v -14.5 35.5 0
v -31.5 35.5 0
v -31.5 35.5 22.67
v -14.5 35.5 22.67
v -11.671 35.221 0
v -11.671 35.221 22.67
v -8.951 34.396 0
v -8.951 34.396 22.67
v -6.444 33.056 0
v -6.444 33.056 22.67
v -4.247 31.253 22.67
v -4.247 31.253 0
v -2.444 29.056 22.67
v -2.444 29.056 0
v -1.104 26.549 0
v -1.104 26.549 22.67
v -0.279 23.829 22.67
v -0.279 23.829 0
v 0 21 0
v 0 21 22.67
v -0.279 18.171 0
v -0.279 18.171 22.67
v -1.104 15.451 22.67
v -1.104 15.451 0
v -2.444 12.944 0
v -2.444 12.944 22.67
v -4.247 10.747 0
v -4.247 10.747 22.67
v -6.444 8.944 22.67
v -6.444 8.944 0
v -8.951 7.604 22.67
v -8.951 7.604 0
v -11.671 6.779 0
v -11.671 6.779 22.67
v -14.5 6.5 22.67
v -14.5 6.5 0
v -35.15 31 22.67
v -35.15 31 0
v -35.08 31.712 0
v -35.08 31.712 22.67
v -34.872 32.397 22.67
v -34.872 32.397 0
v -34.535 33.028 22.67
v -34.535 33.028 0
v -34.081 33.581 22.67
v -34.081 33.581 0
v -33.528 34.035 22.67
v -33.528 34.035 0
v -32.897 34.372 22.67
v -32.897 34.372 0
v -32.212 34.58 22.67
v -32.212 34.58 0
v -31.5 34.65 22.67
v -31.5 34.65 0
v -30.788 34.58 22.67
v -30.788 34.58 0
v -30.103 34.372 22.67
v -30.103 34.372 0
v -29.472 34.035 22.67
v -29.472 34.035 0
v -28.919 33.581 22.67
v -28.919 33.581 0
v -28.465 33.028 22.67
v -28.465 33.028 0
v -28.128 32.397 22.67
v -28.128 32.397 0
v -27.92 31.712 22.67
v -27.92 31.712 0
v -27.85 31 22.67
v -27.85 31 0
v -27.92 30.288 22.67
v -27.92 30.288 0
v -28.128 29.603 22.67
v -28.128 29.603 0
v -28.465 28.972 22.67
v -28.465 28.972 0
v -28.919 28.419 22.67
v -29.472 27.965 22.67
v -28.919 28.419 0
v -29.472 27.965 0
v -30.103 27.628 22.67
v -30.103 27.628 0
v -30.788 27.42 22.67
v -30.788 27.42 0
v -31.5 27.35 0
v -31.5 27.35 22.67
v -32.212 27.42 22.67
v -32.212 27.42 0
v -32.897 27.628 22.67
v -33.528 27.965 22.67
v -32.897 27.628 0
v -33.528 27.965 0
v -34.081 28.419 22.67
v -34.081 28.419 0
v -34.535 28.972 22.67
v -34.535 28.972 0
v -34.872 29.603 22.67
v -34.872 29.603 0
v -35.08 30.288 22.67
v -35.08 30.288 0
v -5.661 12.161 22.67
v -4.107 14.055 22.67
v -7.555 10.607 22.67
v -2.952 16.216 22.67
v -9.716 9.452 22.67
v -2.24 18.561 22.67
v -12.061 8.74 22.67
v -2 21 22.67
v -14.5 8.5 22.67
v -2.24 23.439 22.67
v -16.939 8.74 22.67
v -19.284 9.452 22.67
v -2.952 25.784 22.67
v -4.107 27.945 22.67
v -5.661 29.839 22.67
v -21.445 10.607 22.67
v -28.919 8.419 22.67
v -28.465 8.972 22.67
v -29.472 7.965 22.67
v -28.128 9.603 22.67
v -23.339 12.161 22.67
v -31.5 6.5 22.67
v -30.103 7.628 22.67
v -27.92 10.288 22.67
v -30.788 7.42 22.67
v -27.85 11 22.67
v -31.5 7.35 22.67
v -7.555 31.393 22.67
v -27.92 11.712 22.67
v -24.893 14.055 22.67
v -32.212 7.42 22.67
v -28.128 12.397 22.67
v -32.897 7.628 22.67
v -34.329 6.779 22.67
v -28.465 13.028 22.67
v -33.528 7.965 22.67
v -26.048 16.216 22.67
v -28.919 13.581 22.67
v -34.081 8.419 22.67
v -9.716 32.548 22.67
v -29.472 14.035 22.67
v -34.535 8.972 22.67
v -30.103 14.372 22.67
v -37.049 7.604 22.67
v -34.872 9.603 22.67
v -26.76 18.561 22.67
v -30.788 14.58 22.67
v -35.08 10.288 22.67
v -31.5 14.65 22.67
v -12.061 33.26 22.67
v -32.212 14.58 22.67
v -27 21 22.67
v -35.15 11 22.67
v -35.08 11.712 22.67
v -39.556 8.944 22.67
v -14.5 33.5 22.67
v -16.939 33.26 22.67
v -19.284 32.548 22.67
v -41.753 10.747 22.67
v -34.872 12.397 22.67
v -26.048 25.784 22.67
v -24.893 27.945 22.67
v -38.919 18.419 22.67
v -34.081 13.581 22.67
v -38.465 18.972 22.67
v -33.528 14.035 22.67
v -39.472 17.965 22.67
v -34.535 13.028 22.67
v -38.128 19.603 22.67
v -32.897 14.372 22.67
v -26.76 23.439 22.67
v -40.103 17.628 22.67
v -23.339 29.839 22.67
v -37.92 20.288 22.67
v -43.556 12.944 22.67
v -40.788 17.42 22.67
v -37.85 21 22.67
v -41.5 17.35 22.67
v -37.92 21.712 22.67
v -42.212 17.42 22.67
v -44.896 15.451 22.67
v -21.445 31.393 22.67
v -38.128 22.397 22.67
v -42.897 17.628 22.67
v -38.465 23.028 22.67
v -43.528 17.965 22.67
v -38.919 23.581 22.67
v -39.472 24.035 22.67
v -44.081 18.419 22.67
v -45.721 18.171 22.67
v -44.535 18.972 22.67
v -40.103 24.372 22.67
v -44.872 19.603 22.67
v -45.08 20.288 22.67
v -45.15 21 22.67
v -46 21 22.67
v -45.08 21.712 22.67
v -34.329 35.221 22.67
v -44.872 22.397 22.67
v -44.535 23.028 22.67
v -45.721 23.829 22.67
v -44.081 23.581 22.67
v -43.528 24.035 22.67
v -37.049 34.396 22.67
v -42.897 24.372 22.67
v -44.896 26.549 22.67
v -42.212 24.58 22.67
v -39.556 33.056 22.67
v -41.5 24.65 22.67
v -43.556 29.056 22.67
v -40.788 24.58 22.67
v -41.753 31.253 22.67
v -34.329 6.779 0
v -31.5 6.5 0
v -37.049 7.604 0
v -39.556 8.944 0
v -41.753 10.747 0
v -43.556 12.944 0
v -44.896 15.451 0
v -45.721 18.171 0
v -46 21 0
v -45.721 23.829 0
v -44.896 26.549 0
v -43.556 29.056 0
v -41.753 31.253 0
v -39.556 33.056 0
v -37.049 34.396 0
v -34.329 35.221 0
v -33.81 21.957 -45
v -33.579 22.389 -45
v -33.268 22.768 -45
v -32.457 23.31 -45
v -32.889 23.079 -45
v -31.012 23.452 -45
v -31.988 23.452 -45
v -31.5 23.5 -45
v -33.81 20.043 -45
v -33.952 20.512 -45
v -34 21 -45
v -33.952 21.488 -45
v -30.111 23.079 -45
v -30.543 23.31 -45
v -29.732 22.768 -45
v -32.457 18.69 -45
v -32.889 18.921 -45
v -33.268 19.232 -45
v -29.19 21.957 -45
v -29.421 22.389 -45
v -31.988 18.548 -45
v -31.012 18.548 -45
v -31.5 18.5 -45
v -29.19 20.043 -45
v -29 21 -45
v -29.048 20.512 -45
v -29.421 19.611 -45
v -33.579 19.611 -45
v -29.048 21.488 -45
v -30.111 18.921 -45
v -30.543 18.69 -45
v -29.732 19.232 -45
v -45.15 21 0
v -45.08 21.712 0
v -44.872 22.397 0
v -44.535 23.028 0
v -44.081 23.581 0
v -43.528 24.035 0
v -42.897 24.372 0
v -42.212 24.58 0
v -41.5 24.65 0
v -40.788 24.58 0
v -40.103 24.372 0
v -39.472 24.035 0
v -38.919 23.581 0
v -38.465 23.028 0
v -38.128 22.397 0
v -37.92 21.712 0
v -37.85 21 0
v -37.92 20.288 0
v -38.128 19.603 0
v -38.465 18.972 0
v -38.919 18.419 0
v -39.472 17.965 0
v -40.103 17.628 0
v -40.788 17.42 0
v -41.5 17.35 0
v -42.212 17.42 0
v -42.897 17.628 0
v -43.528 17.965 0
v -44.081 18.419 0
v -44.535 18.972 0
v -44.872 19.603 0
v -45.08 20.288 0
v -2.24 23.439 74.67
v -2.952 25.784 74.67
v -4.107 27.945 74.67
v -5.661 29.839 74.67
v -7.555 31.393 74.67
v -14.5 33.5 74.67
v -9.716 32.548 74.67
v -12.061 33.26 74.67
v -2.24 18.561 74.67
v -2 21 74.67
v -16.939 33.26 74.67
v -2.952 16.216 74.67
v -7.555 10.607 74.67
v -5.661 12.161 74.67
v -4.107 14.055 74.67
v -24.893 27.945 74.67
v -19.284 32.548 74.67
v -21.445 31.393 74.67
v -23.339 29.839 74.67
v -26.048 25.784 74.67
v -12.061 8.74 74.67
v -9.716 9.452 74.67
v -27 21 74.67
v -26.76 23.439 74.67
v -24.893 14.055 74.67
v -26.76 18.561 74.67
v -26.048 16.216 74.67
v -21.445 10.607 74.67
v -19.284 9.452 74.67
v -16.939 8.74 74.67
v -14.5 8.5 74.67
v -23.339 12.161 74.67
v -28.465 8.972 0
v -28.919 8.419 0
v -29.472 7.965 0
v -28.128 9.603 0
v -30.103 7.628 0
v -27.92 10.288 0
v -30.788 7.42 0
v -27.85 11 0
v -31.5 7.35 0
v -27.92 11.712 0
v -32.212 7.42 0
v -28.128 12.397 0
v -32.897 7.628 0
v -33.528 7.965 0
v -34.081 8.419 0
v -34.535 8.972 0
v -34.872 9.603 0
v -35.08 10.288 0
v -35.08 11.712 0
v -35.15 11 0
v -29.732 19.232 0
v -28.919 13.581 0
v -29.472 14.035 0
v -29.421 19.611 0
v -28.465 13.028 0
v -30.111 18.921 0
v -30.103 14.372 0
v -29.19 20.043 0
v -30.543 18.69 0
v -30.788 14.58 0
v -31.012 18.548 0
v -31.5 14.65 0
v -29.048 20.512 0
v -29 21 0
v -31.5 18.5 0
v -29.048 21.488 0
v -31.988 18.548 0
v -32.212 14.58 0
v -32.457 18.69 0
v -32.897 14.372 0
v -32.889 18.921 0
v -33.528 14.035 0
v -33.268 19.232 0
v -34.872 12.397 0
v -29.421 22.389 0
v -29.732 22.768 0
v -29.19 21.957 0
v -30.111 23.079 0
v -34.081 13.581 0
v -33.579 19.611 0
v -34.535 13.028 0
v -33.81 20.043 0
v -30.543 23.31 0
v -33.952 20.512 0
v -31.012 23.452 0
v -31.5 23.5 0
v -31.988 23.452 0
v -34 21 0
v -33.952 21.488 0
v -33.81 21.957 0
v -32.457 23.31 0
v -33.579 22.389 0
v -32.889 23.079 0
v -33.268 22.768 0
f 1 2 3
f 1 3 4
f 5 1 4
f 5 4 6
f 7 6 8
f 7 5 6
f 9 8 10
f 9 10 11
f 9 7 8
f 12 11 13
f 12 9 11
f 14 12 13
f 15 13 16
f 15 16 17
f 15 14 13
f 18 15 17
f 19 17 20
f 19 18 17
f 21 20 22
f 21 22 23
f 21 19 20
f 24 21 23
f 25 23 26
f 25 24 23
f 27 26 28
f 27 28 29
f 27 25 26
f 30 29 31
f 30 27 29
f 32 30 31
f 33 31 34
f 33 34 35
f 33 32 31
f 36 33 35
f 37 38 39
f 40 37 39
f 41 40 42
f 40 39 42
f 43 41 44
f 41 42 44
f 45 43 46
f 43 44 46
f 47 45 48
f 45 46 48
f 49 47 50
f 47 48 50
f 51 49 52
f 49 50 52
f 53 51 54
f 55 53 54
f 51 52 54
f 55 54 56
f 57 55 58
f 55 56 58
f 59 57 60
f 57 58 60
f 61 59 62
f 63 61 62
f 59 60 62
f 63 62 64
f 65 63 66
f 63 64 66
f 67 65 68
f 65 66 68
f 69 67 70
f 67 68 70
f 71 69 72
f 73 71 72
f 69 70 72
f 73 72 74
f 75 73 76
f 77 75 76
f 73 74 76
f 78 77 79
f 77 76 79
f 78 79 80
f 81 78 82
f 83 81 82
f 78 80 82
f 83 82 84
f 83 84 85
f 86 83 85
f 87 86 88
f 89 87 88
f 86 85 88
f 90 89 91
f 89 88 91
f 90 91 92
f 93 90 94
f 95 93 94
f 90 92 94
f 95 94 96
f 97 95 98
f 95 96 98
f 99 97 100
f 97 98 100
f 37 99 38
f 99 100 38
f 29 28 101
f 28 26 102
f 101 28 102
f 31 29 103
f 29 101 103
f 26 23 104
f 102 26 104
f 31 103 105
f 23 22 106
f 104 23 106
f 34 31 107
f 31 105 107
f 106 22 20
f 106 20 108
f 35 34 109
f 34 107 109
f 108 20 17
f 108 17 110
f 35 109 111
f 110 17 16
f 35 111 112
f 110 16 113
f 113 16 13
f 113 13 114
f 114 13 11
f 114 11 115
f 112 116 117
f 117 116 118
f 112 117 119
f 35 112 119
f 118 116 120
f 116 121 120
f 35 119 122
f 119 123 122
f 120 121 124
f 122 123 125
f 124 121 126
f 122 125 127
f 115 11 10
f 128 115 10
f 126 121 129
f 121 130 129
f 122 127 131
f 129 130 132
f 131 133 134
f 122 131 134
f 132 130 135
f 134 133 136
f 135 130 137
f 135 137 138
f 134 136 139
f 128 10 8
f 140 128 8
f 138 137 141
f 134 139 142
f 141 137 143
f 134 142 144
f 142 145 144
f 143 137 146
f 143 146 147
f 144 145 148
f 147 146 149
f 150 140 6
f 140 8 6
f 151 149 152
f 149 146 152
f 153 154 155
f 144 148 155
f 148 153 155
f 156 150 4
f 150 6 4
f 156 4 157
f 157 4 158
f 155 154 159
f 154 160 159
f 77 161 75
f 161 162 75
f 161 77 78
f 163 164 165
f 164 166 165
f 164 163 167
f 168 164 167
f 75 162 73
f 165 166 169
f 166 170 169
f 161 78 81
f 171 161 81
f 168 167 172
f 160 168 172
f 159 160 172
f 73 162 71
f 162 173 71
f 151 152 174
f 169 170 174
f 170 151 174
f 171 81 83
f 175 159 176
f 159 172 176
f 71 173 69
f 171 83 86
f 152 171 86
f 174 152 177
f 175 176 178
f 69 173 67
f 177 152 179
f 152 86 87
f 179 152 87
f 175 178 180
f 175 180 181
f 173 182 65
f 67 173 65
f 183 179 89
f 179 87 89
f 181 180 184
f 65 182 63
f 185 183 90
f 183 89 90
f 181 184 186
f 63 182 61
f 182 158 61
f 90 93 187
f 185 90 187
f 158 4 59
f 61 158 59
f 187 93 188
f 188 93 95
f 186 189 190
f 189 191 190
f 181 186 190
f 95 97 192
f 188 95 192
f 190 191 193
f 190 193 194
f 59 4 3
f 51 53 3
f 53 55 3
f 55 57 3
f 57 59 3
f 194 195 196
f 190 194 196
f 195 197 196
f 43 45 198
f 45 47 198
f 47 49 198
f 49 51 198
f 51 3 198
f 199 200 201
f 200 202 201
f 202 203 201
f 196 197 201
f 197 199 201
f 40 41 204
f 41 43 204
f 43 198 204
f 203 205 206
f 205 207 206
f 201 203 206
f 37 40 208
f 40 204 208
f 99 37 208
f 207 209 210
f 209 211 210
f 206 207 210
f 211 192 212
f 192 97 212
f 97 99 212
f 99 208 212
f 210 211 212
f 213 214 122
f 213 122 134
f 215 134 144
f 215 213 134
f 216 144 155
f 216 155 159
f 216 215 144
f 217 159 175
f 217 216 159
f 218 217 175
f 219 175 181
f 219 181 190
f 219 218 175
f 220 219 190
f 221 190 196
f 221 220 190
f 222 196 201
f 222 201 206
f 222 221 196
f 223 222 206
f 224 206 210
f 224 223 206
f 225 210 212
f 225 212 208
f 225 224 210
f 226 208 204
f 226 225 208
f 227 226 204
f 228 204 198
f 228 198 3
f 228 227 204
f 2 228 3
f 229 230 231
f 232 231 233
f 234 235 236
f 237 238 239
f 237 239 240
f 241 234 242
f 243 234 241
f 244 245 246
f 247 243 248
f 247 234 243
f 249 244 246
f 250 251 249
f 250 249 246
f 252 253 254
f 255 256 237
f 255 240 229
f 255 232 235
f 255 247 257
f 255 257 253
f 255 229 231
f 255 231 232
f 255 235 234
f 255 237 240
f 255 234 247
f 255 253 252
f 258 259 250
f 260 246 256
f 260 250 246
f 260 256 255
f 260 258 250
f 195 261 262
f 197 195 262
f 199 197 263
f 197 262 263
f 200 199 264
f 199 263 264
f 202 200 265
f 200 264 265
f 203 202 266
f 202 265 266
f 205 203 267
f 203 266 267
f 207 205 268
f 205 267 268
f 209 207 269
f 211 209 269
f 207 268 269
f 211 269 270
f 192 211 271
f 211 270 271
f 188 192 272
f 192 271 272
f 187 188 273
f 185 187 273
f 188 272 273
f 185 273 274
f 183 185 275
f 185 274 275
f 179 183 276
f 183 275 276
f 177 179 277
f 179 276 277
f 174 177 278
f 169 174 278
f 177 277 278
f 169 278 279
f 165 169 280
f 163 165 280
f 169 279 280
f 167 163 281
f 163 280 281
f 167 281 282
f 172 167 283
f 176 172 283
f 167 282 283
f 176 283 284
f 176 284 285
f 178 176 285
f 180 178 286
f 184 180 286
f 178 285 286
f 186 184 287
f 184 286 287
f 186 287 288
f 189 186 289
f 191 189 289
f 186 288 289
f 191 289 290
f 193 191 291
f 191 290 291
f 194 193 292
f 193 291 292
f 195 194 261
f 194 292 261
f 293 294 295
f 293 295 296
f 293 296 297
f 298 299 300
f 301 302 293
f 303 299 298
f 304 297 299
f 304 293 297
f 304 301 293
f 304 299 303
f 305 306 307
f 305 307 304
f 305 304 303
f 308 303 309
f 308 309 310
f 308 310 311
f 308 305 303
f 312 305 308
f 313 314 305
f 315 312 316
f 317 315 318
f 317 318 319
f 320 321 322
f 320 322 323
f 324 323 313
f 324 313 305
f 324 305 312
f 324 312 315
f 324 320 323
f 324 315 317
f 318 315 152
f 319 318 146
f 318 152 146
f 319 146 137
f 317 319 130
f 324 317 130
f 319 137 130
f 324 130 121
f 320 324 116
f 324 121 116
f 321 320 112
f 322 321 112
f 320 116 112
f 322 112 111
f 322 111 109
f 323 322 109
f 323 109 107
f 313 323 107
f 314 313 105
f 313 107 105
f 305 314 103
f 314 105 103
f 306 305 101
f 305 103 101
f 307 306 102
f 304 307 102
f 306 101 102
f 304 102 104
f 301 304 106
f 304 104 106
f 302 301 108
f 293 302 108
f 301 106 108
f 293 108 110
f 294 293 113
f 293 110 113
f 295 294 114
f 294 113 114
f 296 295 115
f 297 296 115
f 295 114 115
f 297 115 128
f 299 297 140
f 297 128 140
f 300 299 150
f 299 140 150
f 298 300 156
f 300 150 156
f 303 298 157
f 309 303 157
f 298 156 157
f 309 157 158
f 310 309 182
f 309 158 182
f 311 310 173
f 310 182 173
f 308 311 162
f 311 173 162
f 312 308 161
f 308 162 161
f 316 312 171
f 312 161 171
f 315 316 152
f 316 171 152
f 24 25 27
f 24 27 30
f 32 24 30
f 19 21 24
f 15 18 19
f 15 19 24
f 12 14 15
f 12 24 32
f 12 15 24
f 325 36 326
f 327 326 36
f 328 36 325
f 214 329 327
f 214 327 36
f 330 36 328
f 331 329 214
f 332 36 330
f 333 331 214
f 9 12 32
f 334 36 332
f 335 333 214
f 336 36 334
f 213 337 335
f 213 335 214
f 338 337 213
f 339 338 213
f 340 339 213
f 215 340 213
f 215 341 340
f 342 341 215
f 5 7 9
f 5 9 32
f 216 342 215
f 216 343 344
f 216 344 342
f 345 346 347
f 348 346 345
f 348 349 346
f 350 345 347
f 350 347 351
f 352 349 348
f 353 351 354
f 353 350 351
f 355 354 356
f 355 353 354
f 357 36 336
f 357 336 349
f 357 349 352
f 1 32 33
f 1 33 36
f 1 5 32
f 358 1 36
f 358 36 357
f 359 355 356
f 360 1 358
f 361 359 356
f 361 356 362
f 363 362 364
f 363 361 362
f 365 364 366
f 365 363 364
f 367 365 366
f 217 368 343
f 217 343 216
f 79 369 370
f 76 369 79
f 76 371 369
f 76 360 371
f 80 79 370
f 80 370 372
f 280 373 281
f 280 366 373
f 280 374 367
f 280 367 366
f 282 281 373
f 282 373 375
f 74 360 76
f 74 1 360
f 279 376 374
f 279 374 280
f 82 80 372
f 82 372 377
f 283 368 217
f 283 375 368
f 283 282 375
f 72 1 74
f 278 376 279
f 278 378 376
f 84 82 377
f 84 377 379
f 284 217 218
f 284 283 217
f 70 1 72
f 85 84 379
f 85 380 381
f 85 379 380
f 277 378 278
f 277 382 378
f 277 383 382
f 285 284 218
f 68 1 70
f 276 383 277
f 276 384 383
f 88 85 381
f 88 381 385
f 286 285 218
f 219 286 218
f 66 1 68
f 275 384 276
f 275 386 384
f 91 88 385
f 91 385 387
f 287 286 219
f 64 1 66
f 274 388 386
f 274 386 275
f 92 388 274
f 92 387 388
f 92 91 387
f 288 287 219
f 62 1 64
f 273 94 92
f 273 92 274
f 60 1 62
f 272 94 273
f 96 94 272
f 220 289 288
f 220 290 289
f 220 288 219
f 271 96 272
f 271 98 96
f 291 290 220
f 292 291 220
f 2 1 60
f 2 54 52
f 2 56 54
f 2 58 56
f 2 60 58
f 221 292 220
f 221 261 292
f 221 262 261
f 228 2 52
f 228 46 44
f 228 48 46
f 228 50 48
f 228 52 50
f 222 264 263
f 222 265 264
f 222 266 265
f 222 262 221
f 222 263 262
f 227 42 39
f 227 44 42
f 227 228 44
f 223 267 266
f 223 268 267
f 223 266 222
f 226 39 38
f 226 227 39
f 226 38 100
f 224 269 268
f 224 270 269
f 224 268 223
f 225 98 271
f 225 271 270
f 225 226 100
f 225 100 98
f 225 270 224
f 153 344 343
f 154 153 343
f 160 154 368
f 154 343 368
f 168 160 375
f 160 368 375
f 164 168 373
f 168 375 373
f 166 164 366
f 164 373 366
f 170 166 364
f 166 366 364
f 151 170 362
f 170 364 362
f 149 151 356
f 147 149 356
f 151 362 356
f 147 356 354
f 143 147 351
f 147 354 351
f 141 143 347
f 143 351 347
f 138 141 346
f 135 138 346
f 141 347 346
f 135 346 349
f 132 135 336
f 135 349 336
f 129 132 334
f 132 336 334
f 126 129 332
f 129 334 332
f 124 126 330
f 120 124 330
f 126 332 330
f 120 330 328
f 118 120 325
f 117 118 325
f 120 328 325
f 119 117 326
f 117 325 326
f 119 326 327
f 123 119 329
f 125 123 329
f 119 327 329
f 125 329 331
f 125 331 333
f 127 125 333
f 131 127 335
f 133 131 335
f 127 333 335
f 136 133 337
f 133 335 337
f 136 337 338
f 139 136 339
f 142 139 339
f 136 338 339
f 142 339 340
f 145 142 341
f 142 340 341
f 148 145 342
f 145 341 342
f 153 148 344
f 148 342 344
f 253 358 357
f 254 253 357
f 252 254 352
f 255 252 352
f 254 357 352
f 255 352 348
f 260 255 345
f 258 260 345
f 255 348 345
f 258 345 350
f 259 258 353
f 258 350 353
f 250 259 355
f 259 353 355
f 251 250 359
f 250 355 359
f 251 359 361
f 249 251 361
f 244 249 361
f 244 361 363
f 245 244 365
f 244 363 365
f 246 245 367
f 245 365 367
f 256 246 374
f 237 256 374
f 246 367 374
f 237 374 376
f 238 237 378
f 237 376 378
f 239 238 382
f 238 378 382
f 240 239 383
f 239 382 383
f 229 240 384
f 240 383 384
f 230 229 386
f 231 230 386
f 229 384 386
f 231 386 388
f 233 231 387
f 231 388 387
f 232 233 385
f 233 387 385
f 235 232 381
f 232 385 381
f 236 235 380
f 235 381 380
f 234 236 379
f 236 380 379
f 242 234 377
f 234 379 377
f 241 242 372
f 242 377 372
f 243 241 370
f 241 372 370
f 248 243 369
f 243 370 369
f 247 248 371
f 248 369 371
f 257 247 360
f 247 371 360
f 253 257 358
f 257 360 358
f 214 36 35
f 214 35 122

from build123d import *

# Parameters (mm, degrees)
EXTRUDE_1_DEPTH     = 22.67
SKETCH_3_R          = 3.65
CUT_EXTRUDE_1_DEPTH = 22.67
SKETCH_7_R          = 2.5
EXTRUDE_2_DEPTH     = 45
SKETCH_8_R          = 12.5
EXTRUDE_3_DEPTH     = 52


with BuildPart() as part:
    # 草图1 → 凸台-拉伸1 (new body)
    with BuildSketch(Plane.XY):
        with BuildLine():
            Line((-31.5, 35.5), (-14.5, 35.5))
            ThreePointArc((-14.5, 35.5), (0, 21), (-14.5, 6.5))
            Line((-14.5, 6.5), (-31.5, 6.5))
            ThreePointArc((-31.5, 6.5), (-46, 21), (-31.5, 35.5))
        make_face()
    extrude(amount=EXTRUDE_1_DEPTH)

    # 草图3 → 切除-拉伸1 (cut)
    with BuildSketch(Plane(origin=(0, 0, 0), x_dir=(-1, 0, 0), z_dir=(0, 0, -1))):
        with Locations((31.5, 11)):
            Circle(SKETCH_3_R)
        with Locations((31.5, 31)):
            Circle(SKETCH_3_R)
        with Locations((41.5, 21)):
            Circle(SKETCH_3_R)
    extrude(amount=-CUT_EXTRUDE_1_DEPTH, mode=Mode.SUBTRACT)

    # 草图7 → 凸台-拉伸2 (add)
    with BuildSketch(Plane(origin=(0, 0, 0), x_dir=(-1, 0, 0), z_dir=(0, 0, -1))):
        with Locations(Location((31.5, 21, 0), (0, 0, 180))):
            Circle(SKETCH_7_R)
    extrude(amount=EXTRUDE_2_DEPTH)

    # 草图8 → 凸台-拉伸3 (add)
    with BuildSketch(Plane.XY.offset(22.67)):
        with Locations(Location((-14.5, 21, 0), (0, 0, 180))):
            Circle(SKETCH_8_R)
    extrude(amount=EXTRUDE_3_DEPTH)


solid = part.part
